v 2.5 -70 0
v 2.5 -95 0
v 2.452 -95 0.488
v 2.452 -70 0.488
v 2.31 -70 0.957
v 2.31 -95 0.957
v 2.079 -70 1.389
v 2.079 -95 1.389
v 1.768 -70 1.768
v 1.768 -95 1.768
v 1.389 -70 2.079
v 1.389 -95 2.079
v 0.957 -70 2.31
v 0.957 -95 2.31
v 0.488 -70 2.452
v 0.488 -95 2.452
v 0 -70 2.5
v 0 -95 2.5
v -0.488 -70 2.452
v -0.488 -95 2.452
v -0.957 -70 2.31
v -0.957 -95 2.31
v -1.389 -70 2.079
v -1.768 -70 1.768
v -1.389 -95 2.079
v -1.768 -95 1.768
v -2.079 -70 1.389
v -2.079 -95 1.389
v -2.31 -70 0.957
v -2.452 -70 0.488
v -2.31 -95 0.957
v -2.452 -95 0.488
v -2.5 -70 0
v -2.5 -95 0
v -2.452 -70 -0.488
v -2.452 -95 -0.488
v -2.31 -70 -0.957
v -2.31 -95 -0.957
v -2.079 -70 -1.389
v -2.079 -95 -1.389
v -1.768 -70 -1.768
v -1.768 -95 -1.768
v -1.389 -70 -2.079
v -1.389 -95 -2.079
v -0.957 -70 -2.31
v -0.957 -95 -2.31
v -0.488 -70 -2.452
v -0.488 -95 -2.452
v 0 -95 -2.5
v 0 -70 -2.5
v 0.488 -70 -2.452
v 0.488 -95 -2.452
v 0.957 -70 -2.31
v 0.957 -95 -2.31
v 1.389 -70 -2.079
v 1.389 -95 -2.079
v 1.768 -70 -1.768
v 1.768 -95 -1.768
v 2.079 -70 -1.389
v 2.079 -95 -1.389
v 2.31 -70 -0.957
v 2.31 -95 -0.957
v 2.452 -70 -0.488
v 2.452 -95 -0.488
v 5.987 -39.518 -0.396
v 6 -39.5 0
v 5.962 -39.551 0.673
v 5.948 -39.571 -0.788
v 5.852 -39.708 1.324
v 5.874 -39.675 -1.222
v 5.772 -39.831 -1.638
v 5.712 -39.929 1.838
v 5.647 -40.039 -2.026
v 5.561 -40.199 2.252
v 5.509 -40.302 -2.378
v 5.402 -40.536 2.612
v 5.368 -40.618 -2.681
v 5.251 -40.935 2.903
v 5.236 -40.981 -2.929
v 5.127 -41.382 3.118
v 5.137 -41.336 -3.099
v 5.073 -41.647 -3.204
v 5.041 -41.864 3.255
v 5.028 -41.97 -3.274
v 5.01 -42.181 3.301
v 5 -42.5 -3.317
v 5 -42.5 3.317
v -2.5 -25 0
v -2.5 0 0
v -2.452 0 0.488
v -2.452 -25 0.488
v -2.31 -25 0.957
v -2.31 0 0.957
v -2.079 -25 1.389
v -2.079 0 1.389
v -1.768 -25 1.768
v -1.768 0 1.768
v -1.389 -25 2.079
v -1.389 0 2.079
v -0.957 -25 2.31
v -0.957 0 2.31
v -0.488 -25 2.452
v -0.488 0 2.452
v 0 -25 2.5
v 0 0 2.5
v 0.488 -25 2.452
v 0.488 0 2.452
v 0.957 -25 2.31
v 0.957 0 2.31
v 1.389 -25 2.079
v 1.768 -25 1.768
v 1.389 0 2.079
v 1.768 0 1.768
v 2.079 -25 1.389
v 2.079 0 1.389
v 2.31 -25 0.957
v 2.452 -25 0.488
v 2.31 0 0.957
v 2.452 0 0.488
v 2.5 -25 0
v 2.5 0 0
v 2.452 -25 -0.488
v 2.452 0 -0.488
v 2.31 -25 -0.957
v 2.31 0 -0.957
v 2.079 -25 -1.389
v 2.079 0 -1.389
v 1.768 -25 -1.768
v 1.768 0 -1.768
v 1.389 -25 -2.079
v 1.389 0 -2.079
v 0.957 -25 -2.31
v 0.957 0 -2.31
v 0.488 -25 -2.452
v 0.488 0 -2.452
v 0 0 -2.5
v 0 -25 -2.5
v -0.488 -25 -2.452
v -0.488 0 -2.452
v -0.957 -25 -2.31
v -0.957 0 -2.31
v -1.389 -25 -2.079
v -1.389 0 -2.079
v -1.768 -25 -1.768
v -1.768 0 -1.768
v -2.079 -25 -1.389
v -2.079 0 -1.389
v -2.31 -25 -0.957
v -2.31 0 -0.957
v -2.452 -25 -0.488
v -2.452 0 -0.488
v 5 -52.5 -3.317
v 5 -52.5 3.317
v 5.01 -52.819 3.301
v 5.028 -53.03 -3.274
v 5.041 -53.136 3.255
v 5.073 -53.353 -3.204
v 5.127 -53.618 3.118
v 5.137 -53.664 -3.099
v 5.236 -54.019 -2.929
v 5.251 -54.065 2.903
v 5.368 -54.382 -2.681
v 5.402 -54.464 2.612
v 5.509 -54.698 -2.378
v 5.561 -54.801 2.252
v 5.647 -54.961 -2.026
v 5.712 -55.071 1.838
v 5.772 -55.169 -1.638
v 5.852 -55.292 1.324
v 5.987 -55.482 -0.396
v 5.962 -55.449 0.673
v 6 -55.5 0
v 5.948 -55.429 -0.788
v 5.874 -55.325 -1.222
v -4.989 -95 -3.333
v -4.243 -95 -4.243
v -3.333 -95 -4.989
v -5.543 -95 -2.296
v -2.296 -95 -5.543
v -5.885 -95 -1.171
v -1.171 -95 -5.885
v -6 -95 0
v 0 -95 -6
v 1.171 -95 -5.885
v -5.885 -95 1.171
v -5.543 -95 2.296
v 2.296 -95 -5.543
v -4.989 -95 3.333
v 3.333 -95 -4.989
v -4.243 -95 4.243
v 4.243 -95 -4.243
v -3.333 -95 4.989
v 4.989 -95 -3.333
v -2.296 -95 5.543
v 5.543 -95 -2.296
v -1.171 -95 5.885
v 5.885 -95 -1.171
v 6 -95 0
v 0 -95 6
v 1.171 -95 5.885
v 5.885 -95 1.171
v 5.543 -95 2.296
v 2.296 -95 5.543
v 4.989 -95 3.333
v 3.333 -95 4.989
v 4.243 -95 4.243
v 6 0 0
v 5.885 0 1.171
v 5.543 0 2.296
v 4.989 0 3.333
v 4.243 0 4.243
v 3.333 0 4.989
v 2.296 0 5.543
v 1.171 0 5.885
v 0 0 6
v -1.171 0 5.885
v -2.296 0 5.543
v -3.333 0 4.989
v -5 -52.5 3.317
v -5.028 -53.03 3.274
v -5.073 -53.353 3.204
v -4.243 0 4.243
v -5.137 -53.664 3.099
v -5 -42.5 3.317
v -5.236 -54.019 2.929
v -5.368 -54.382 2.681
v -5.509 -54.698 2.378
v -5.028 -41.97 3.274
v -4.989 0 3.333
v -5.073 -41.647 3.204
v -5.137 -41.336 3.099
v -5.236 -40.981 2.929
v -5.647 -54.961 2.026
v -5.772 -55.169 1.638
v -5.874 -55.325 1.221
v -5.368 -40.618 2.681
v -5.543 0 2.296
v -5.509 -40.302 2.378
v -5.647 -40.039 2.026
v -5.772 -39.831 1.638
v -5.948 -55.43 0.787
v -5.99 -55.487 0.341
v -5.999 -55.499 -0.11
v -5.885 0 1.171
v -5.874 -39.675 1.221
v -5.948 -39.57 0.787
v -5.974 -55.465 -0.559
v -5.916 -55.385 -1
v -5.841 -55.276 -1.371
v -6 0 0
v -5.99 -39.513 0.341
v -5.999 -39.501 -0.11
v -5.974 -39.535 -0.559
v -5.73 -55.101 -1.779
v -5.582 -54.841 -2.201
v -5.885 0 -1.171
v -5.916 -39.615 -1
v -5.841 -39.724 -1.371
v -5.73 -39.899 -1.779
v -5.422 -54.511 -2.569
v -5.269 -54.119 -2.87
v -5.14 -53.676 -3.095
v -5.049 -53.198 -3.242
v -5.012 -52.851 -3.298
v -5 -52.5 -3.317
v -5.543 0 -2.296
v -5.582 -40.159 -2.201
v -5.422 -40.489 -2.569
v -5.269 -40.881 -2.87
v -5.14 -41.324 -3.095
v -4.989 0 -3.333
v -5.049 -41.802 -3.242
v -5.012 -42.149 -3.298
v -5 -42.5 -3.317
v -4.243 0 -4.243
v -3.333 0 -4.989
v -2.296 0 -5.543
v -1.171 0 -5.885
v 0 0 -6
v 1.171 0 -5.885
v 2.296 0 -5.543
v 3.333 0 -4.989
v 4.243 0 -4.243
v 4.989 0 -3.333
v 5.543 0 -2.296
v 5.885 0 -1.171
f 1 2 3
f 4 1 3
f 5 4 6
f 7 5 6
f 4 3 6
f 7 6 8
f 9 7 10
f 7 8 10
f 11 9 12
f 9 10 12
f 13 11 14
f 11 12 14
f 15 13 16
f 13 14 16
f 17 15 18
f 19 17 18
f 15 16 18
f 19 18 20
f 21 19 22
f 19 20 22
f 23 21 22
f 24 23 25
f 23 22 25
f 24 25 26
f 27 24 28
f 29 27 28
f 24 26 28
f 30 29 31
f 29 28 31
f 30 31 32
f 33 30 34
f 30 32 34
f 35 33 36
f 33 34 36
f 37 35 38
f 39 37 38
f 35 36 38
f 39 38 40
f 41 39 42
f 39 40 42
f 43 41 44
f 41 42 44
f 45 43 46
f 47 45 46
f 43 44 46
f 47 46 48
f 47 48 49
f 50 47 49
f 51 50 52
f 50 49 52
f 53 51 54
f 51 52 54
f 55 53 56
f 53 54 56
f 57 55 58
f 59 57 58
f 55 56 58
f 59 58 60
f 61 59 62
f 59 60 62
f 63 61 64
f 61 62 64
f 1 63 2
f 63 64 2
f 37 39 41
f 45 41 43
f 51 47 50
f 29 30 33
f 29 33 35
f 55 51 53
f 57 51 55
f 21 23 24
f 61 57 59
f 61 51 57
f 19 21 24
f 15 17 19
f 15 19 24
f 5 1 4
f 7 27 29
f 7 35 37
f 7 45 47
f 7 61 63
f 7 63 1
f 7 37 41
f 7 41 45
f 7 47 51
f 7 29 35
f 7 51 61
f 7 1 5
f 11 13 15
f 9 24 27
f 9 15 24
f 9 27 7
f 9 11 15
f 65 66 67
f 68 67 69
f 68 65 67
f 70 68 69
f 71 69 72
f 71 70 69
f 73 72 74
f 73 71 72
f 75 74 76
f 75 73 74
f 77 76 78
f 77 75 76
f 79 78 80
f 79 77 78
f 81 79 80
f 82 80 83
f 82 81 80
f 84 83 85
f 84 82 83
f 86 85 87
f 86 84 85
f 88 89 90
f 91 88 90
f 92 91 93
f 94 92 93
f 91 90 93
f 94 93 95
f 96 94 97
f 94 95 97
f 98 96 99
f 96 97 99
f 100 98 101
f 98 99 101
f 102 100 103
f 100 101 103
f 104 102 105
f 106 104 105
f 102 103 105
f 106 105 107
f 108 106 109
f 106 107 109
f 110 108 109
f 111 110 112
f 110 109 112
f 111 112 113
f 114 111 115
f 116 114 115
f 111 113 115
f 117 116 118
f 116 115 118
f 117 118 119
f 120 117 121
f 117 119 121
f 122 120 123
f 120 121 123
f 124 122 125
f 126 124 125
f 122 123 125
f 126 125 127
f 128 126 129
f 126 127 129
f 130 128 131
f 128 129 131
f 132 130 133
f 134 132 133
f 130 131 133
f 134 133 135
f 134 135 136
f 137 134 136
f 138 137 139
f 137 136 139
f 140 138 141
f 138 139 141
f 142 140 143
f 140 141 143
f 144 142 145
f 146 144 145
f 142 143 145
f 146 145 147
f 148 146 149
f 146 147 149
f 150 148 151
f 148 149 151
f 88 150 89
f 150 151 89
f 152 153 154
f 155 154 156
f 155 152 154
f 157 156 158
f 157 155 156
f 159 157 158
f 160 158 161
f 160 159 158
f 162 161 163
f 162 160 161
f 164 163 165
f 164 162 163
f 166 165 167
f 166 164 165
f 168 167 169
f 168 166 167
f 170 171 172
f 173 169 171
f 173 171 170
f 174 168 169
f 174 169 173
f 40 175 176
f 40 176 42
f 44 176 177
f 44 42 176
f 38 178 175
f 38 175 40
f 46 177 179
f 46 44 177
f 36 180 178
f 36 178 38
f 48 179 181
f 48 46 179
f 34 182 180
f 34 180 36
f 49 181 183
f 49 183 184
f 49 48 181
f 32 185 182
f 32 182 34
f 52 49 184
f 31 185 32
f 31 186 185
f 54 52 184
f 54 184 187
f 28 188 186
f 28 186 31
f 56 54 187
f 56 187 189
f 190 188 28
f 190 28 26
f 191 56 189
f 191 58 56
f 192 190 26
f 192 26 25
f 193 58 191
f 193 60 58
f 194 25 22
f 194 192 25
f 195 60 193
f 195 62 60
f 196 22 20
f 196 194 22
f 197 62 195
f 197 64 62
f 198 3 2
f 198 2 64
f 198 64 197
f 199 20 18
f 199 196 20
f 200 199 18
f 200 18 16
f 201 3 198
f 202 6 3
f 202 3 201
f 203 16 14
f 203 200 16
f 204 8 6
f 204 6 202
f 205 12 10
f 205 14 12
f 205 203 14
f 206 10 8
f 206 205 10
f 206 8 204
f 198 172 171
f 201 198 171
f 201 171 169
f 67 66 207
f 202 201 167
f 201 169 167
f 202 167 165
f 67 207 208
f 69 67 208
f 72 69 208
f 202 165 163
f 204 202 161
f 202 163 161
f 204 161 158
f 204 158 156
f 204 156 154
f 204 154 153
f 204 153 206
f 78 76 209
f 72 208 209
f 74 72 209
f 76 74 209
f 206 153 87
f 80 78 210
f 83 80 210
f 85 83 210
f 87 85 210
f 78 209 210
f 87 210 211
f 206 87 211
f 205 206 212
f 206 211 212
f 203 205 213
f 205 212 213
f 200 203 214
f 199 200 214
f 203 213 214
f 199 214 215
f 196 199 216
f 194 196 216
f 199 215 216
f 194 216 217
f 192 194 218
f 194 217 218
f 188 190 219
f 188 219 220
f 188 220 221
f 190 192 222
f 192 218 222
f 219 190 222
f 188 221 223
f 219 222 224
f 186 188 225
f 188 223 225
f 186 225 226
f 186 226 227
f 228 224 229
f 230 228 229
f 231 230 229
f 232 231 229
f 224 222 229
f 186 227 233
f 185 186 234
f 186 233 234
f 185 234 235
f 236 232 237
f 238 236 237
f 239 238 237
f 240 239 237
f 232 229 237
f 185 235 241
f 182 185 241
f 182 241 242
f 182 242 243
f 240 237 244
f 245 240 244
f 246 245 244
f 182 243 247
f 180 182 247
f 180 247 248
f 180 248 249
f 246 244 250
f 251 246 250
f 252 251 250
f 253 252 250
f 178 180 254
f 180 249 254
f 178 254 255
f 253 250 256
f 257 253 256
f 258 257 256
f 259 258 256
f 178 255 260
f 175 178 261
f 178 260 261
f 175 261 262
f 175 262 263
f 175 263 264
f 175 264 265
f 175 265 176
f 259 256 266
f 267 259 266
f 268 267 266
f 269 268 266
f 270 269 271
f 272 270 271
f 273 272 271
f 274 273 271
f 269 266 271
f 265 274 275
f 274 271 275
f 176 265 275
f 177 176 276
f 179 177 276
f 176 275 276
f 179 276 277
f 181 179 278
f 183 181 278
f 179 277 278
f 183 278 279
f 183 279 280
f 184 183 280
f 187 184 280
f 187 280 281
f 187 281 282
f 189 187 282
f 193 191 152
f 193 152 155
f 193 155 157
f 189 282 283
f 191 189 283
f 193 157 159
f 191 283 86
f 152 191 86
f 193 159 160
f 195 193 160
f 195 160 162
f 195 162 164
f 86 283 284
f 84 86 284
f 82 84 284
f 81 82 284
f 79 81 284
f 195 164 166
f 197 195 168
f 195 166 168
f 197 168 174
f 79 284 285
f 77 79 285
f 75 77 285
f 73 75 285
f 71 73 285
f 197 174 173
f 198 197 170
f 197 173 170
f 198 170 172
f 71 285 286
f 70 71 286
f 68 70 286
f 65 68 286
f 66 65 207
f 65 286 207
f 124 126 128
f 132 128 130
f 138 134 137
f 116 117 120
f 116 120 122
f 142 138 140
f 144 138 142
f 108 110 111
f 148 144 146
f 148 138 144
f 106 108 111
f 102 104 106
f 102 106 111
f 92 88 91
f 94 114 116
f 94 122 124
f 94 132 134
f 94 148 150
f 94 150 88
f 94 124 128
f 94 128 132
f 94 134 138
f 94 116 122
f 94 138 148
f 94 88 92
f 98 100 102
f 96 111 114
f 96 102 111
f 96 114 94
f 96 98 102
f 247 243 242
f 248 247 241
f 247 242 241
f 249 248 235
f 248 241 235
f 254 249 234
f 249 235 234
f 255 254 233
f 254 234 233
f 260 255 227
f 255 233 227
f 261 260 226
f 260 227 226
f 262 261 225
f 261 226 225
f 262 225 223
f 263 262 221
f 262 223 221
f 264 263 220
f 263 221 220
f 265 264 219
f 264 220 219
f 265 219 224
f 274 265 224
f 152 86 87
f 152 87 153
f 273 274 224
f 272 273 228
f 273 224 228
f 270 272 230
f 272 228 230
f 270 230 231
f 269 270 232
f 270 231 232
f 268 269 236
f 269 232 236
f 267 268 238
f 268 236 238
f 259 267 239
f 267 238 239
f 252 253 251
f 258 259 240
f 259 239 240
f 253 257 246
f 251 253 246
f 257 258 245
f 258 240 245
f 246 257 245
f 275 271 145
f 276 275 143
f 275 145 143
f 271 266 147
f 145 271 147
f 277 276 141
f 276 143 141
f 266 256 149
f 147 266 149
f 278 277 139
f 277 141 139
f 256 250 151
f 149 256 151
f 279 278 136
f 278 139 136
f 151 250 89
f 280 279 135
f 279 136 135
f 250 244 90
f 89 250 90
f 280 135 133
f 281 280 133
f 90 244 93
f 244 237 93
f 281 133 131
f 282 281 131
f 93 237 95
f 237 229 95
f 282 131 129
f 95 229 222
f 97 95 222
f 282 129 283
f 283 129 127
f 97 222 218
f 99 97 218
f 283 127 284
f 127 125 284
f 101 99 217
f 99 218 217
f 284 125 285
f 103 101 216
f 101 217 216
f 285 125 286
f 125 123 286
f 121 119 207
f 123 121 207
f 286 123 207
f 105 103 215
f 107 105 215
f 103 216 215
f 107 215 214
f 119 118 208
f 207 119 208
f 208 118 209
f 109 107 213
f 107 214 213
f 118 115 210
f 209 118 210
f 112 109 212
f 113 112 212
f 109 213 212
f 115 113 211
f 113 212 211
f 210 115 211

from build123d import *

# Parameters (mm, degrees)
F0_R     = 6
F1_DEPTH = 95
F2_R     = 2.5
F3_DEPTH = 25
F4_R     = 2.5
F5_DEPTH = 25
F7_DEPTH = 12.5


with BuildPart() as f1:
    # F0 (on Front) → F1 (new body)
    with BuildSketch(Plane.XZ):
        Circle(F0_R)
    extrude(amount=F1_DEPTH)

    # F2 (on face) → F3 (cut)
    with BuildSketch(Plane.XZ.offset(95)):
        Circle(F2_R)
    extrude(amount=-F3_DEPTH, mode=Mode.SUBTRACT)

    # F4 (on face) → F5 (cut)
    with BuildSketch(Plane(origin=(0, 0, 0), x_dir=(-1, 0, 0), z_dir=(0, 1, 0))):
        Circle(F4_R)
    extrude(amount=-F5_DEPTH, mode=Mode.SUBTRACT)

    # F6 (on Top) → F7 (cut, symmetric)
    with BuildSketch(Plane.XY):
        with BuildLine():
            Line((11.650951, -37.5), (10, -37.5))
            ThreePointArc((10, -37.5), (6.464466, -38.964466), (5, -42.5))
            Line((5, -42.5), (5, -52.5))
            ThreePointArc((5, -52.5), (6.464466, -56.035534), (10, -57.5))
            Line((10, -57.5), (11.650951, -57.5))
            Line((11.650951, -57.5), (11.650951, -37.5))
        make_face()
        with BuildLine():
            ThreePointArc((-5, -42.5), (-6.464466, -38.964466), (-10, -37.5))
            Line((-10, -37.5), (-11.650951, -37.5))
            Line((-11.650951, -37.5), (-11.650951, -57.5))
            Line((-11.650951, -57.5), (-10, -57.5))
            ThreePointArc((-10, -57.5), (-6.464466, -56.035534), (-5, -52.5))
            Line((-5, -52.5), (-5, -42.5))
        make_face()
    extrude(amount=F7_DEPTH, both=True, mode=Mode.SUBTRACT)


solid = f1.part
